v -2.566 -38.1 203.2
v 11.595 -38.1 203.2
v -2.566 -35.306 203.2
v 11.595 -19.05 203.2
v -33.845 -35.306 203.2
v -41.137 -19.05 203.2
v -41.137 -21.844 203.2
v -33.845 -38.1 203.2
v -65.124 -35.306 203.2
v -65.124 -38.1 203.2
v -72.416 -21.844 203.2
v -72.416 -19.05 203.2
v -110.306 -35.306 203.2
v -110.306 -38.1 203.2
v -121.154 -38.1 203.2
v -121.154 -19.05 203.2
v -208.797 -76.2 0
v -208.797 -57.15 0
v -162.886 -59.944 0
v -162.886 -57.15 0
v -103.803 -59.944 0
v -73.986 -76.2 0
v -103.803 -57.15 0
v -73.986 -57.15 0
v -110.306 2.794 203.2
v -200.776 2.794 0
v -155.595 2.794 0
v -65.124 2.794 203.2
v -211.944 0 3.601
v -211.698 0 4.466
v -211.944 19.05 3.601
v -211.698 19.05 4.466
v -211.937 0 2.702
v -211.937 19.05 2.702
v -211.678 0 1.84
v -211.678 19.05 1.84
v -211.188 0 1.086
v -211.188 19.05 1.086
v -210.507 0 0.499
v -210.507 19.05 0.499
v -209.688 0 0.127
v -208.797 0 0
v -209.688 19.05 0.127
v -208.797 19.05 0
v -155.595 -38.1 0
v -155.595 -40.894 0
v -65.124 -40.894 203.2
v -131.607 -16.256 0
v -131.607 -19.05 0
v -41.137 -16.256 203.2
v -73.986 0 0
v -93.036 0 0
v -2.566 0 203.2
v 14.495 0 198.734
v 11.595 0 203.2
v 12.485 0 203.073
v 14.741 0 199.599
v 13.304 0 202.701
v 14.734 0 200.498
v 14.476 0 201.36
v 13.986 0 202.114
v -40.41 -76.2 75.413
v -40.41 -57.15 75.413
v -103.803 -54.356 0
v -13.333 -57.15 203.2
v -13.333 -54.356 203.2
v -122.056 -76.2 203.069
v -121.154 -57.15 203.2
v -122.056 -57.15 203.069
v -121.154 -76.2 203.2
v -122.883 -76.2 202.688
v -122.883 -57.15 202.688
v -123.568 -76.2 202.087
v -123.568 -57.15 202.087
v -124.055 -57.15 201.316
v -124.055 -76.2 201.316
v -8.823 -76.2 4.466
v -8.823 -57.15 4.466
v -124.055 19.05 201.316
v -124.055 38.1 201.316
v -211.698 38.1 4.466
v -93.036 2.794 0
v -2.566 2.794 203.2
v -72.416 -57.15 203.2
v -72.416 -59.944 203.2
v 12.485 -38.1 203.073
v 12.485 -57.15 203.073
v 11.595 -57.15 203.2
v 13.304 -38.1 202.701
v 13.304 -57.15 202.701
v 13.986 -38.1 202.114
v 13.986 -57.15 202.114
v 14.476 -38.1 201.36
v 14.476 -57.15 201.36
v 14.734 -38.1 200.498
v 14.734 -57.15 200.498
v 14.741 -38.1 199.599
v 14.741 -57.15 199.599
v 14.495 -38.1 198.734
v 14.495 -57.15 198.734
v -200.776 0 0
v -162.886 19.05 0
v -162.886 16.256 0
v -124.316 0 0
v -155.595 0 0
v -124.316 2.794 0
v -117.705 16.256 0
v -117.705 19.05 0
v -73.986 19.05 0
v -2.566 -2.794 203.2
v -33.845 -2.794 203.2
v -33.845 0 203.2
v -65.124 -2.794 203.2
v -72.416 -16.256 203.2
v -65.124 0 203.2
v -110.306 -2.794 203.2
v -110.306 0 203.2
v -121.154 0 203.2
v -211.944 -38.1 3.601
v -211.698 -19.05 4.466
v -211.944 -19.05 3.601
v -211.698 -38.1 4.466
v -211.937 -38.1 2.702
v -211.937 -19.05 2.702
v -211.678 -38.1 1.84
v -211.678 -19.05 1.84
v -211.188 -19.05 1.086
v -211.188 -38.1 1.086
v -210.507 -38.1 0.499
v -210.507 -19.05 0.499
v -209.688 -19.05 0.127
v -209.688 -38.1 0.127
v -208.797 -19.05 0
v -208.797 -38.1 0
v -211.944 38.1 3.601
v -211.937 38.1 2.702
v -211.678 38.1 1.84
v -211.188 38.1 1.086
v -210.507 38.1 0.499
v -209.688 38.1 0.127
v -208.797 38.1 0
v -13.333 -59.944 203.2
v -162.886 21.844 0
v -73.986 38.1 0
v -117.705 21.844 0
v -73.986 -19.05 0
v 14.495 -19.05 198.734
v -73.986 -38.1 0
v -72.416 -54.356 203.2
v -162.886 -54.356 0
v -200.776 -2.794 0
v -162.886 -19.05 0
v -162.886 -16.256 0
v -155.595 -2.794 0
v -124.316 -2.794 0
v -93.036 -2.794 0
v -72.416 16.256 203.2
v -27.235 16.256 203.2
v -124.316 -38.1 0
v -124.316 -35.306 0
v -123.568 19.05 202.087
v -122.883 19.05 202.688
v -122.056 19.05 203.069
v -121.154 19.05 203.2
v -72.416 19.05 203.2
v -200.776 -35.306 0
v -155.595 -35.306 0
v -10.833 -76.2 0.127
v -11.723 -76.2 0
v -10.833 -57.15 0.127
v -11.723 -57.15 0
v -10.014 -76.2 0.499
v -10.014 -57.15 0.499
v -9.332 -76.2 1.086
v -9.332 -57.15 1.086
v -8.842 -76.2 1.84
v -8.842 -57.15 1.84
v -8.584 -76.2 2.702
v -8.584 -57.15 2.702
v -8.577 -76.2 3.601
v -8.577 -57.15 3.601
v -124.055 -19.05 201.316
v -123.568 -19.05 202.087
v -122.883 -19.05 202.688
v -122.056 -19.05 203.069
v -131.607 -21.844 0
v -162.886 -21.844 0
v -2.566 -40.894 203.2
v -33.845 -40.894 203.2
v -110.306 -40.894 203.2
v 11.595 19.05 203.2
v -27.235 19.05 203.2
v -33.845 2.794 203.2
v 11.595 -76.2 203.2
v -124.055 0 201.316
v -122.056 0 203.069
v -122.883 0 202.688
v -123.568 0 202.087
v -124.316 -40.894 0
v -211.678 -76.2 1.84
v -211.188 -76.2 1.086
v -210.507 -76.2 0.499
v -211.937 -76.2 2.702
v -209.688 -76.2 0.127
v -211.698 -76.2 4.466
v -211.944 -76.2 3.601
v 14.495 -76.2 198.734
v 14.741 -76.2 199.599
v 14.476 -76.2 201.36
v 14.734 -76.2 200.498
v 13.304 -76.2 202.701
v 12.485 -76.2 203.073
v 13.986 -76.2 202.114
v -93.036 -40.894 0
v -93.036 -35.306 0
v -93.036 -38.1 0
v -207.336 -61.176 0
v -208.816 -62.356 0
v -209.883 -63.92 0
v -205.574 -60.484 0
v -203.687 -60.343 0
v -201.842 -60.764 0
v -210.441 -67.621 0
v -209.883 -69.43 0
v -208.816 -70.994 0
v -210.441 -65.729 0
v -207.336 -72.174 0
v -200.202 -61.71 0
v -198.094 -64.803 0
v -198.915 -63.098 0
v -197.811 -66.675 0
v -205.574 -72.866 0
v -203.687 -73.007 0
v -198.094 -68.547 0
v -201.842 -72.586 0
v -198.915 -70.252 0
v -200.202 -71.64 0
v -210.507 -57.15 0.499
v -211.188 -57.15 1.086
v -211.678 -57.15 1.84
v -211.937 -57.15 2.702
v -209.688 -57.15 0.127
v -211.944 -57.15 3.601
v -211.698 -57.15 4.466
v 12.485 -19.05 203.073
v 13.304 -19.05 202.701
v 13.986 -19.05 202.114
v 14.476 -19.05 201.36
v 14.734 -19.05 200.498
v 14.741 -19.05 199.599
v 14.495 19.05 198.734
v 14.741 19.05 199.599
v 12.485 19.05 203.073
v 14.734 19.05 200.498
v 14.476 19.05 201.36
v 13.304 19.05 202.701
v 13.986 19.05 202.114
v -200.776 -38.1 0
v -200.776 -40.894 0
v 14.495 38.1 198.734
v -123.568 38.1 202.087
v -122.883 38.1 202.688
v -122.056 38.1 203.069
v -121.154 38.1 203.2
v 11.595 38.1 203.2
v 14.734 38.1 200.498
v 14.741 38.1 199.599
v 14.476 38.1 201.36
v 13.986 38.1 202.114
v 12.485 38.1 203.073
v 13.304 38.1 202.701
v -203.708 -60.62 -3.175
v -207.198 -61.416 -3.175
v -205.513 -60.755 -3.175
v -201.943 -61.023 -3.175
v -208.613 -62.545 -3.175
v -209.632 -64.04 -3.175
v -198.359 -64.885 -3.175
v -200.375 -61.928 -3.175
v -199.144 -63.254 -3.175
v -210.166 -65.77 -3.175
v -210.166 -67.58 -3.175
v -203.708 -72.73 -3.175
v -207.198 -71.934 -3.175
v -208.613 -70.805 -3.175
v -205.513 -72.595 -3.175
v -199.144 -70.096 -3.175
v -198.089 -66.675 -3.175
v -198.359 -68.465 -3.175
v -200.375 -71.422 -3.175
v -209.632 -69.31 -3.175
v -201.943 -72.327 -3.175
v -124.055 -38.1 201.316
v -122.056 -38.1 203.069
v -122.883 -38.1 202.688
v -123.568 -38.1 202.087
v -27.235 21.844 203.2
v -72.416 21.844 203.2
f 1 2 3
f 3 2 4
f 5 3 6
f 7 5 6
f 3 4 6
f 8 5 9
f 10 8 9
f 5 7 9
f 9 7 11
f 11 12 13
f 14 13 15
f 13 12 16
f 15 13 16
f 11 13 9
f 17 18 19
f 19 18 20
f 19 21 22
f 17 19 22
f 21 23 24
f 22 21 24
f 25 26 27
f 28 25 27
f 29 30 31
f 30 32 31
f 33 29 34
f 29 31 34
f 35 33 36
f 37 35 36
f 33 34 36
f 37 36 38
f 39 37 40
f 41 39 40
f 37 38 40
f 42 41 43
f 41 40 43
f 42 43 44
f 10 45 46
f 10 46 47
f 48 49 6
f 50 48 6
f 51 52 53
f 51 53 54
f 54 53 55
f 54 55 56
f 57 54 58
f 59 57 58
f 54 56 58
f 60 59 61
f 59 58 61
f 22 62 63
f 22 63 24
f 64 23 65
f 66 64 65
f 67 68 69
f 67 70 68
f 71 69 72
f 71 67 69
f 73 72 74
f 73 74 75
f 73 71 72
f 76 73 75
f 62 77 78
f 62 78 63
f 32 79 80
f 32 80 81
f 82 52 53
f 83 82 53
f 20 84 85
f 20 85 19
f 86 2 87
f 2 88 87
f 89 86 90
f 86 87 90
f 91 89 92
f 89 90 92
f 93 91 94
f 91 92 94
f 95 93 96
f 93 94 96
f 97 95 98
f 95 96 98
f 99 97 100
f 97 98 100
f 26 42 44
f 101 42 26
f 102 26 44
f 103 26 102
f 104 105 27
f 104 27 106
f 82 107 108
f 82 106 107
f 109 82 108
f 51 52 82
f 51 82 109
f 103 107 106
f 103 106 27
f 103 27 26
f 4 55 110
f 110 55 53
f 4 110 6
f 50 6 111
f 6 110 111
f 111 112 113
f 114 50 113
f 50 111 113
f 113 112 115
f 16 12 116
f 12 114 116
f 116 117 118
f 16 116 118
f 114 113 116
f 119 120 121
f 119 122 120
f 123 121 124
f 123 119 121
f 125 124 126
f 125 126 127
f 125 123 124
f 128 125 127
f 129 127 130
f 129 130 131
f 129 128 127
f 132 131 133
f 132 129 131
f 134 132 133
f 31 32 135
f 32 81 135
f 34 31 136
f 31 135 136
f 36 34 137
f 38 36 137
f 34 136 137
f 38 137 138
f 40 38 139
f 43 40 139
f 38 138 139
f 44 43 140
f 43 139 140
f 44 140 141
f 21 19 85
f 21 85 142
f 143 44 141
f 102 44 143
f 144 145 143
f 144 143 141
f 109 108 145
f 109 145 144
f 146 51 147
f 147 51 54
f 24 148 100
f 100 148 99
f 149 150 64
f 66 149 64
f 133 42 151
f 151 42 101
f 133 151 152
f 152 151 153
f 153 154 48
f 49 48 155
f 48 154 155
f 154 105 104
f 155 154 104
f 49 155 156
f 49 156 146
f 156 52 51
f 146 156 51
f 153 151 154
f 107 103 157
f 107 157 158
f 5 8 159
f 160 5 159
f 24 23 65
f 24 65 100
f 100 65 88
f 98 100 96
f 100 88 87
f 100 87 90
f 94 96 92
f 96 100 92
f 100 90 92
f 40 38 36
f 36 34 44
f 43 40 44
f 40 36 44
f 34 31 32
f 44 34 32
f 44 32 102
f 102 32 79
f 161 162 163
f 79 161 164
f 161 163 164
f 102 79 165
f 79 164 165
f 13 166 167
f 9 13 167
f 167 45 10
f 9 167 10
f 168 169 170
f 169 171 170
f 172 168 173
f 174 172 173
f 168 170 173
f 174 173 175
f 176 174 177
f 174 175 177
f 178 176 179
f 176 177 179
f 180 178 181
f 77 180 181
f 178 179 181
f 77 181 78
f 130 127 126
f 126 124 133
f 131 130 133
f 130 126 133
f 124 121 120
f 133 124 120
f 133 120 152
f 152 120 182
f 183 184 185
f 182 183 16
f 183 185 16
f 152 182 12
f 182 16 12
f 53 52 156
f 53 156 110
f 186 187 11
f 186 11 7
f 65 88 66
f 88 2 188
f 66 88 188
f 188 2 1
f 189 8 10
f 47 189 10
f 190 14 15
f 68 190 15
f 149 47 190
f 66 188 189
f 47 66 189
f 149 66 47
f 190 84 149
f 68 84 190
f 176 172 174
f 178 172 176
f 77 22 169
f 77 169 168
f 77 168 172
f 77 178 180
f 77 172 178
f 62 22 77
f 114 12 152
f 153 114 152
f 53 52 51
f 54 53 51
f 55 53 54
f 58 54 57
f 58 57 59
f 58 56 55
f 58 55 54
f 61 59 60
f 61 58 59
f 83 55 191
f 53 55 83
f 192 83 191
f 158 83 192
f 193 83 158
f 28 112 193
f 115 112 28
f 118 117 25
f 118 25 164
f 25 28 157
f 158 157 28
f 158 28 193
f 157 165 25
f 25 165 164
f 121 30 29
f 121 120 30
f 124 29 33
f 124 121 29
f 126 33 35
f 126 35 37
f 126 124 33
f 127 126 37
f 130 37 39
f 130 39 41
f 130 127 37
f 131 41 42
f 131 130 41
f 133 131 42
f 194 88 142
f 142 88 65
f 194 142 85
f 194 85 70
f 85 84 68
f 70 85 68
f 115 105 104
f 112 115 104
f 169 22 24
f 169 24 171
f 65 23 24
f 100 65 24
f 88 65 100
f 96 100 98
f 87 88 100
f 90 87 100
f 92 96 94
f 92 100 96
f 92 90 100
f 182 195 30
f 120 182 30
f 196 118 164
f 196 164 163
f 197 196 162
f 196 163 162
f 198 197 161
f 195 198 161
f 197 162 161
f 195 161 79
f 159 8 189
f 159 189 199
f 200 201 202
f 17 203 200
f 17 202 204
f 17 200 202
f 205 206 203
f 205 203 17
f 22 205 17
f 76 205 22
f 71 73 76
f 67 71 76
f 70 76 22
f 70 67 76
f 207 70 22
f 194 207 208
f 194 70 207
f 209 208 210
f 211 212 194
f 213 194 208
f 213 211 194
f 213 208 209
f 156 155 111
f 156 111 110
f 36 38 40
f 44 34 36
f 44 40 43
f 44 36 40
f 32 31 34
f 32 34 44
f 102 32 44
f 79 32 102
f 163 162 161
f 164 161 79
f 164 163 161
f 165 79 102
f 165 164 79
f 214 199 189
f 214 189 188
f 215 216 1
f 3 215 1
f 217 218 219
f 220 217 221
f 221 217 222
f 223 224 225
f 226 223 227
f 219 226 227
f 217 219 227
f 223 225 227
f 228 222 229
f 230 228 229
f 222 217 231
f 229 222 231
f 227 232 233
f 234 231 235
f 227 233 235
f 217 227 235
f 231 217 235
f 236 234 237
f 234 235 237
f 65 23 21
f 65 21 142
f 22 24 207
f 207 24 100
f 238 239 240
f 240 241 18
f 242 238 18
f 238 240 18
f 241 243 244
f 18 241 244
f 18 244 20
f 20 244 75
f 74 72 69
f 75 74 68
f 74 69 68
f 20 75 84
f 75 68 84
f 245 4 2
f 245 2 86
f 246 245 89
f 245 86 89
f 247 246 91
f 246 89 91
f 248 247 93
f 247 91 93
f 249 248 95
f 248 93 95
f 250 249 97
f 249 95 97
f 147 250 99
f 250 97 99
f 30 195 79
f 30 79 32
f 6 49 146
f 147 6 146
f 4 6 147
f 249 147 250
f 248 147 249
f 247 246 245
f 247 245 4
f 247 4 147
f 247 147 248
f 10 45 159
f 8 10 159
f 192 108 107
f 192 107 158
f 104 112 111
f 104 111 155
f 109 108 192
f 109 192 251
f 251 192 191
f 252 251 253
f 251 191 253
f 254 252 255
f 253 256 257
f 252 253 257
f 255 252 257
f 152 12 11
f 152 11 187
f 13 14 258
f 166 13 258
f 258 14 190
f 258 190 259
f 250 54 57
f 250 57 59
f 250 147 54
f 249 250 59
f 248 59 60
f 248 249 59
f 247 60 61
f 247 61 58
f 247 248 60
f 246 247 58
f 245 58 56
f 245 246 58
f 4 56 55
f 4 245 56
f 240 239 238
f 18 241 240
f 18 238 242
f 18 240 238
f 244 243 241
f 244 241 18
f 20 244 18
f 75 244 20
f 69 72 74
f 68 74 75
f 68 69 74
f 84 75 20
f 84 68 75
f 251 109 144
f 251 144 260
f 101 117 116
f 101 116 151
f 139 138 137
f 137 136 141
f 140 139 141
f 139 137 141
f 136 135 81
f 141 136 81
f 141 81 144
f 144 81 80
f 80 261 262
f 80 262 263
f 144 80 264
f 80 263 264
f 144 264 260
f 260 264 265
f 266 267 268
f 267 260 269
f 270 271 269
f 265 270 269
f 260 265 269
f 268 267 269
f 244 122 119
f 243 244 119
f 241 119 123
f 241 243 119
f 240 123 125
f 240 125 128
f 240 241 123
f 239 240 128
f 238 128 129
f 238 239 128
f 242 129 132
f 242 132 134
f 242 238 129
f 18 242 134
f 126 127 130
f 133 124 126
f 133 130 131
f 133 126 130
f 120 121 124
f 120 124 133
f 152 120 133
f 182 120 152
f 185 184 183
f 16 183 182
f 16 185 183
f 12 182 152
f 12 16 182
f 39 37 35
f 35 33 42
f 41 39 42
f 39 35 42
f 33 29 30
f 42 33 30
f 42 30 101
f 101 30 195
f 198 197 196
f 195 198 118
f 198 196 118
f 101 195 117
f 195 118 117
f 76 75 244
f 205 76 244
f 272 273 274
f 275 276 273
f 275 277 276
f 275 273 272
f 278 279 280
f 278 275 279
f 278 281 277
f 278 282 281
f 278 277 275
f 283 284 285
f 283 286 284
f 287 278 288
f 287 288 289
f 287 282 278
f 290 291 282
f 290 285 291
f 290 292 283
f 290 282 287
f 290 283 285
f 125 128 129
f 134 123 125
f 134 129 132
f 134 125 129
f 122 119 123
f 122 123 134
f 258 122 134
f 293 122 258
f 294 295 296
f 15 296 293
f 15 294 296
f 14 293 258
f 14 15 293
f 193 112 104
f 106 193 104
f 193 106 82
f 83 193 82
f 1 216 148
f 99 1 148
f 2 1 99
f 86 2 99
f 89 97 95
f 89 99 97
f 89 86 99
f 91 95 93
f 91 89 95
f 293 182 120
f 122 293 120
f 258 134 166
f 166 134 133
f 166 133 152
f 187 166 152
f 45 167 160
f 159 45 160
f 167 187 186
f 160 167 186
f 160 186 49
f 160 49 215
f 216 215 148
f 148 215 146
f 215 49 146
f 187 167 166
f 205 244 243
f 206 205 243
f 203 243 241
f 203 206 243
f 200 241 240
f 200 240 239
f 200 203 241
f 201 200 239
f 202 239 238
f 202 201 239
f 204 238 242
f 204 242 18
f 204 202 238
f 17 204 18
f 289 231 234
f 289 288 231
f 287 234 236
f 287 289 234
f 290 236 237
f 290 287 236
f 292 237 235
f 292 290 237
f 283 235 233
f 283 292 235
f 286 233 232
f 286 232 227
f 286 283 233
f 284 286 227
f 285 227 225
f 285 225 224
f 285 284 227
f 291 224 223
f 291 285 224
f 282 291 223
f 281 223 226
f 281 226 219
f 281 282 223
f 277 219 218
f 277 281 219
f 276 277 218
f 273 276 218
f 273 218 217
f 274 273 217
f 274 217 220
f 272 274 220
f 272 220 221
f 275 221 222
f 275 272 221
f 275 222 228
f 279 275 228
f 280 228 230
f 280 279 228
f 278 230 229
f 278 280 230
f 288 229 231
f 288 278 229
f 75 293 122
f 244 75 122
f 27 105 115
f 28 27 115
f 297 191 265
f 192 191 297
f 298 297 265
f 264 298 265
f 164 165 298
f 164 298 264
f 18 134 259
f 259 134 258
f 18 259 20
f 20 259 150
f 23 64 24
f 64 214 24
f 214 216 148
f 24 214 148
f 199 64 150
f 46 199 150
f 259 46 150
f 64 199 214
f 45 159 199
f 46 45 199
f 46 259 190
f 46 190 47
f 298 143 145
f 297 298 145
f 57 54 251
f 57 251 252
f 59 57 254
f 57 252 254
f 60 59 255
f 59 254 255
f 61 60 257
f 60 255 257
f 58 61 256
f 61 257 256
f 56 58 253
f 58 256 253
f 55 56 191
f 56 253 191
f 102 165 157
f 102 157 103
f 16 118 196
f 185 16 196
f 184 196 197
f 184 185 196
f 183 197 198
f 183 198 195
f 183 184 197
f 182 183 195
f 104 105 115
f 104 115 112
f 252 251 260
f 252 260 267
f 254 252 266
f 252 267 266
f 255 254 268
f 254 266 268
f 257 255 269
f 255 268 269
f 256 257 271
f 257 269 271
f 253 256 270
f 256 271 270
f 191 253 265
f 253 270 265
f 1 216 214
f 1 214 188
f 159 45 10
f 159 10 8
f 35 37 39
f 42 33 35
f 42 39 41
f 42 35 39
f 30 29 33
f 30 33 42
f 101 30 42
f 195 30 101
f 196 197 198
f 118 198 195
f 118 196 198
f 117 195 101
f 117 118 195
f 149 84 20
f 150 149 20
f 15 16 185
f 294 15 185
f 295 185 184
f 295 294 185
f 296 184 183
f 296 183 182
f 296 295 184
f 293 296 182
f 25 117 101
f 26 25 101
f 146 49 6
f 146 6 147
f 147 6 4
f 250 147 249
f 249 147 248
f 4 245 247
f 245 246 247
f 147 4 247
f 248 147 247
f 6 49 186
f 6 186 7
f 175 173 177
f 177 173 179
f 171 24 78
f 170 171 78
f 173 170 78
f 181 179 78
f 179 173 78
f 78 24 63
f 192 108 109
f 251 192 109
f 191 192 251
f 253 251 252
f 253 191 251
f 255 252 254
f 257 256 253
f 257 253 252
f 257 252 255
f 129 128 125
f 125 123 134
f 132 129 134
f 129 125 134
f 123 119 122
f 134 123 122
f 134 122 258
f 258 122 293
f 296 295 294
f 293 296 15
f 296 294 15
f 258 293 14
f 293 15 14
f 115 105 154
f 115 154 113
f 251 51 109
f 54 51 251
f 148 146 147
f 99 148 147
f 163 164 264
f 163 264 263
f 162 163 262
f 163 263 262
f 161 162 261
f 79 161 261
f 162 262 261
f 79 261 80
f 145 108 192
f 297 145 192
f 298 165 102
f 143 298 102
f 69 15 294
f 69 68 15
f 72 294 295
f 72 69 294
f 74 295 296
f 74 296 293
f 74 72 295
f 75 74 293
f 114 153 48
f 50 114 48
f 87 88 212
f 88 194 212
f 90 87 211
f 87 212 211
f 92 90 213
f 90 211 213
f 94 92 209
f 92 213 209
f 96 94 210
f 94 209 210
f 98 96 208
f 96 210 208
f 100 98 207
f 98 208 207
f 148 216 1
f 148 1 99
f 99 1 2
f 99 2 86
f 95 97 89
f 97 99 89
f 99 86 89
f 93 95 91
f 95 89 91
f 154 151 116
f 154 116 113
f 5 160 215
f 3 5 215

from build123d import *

# Parameters (mm, degrees)
F1_DEPTH  = 19.05
F6_DEPTH  = 19.05
F8_DEPTH  = 19.05
F9_DEPTH  = 19.05
F11_DEPTH = 19.05
F14_DEPTH = 19.05
F16_DEPTH = 2.794
F17_DEPTH = 2.794
F19_DEPTH = 2.794
F20_DEPTH = 2.794
F22_DEPTH = 2.794
F23_DEPTH = 2.794
F25_DEPTH = 2.794
F26_DEPTH = 2.794
F28_DEPTH = 2.794
F29_DEPTH = 2.794
F31_DEPTH = 19.05
F32_R     = 3.175
F32_2_R   = 3.175
F32_3_R   = 3.175
F32_4_R   = 3.175
F32_5_R   = 3.175
F32_6_R   = 3.175
F33_R     = 3.175
F33_2_R   = 3.175
F33_3_R   = 3.175
F33_4_R   = 3.175
F33_5_R   = 3.175
F33_6_R   = 3.175
F34_R     = 6.35
F35_DEPTH = 3.175
F35_TAPER = 5
F36_R     = 3.175
F37_R     = 3.175
F37_2_R   = 3.175
F37_3_R   = 3.175
F37_4_R   = 3.175
F37_5_R   = 3.175
F37_6_R   = 3.175


with BuildPart() as f1:
    # F0 (on Front) → F1 (new body)
    with BuildSketch(Plane.XZ):
        Polygon((-213.6864438653, 0), (-73.9864438653, 0), (16.4840249894, 203.2), (-123.2159750106, 203.2), align=None)
    extrude(amount=F1_DEPTH)

    # F18 (on face) → F20 (cut)
    with BuildSketch(Plane.XZ):
        Polygon((-2.5659750106, 203.2), (-33.8452066689, 203.2), (-124.3156755236, 0), (-93.0364438653, 0), align=None)
        Polygon((-65.1244383272, 203.2), (-110.3055507226, 203.2), (-200.7760195773, 0), (-155.5949071819, 0), align=None)
    extrude(amount=F20_DEPTH, mode=Mode.SUBTRACT)

    # F21 (on face) → F22 (cut)
    with BuildSketch(Plane.XZ.offset(19.05)):
        Polygon((-41.1367433523, 203.2), (-72.4159750106, 203.2), (-162.8864438653, 0), (-131.607212207, 0), align=None)
    extrude(amount=-F22_DEPTH, mode=Mode.SUBTRACT)

    # F32#3
    f32_3_edges = [f1.edges().sort_by_distance(p)[0] for p in [
        (16.484025, -9.525, 203.2),
    ]]
    fillet(f32_3_edges, radius=F32_3_R)

    # F33#3
    f33_3_edges = [f1.edges().sort_by_distance(p)[0] for p in [
        (-123.215975, -9.525, 203.2),
    ]]
    fillet(f33_3_edges, radius=F33_3_R)

    # F37#3
    f37_3_edges = [f1.edges().sort_by_distance(p)[0] for p in [
        (-213.686444, -9.525, 0),
    ]]
    fillet(f37_3_edges, radius=F37_3_R)


with BuildPart() as f6:
    # F5 (on offset) → F6 (new body)
    with BuildSketch(Plane.XZ.offset(19.05)):
        Polygon((-123.2159750106, 203.2), (-213.6864438653, 0), (-73.9864438653, 0), (16.4840249894, 203.2), align=None)
    extrude(amount=F6_DEPTH)

    # F21 (on face) → F23 (cut)
    with BuildSketch(Plane.XZ.offset(19.05)):
        Polygon((-41.1367433523, 203.2), (-72.4159750106, 203.2), (-162.8864438653, 0), (-131.607212207, 0), align=None)
    extrude(amount=F23_DEPTH, mode=Mode.SUBTRACT)

    # F24 (on face) → F25 (cut)
    with BuildSketch(Plane.XZ.offset(38.1)):
        Polygon((-65.1244383272, 203.2), (-110.3055507226, 203.2), (-200.7760195773, 0), (-155.5949071819, 0), align=None)
        Polygon((-2.5659750106, 203.2), (-33.8452066689, 203.2), (-124.3156755236, 0), (-93.0364438653, 0), align=None)
    extrude(amount=-F25_DEPTH, mode=Mode.SUBTRACT)

    # F32#4
    f32_4_edges = [f6.edges().sort_by_distance(p)[0] for p in [
        (16.484025, -28.575, 203.2),
    ]]
    fillet(f32_4_edges, radius=F32_4_R)

    # F33#4
    f33_4_edges = [f6.edges().sort_by_distance(p)[0] for p in [
        (-123.215975, -28.575, 203.2),
    ]]
    fillet(f33_4_edges, radius=F33_4_R)

    # F37#4
    f37_4_edges = [f6.edges().sort_by_distance(p)[0] for p in [
        (-213.686444, -28.575, 0),
    ]]
    fillet(f37_4_edges, radius=F37_4_R)


with BuildPart() as f8:
    # F7 (on offset) → F8 (new body)
    with BuildSketch(Plane.XZ.offset(38.1)):
        Polygon((16.4840249894, 203.2), (-123.2159750106, 203.2), (-213.6864438653, 0), (-73.9864438653, 0), align=None)
    extrude(amount=F8_DEPTH)

    # F24 (on face) → F26 (cut)
    with BuildSketch(Plane.XZ.offset(38.1)):
        Polygon((-2.5659750106, 203.2), (-33.8452066689, 203.2), (-124.3156755236, 0), (-93.0364438653, 0), align=None)
        Polygon((-65.1244383272, 203.2), (-110.3055507226, 203.2), (-200.7760195773, 0), (-155.5949071819, 0), align=None)
    extrude(amount=F26_DEPTH, mode=Mode.SUBTRACT)

    # F27 (on face) → F28 (cut)
    with BuildSketch(Plane.XZ.offset(57.15)):
        Polygon((-13.3329818782, 203.2), (-72.4159750106, 203.2), (-162.8864438653, 0), (-103.8034507329, 0), align=None)
    extrude(amount=-F28_DEPTH, mode=Mode.SUBTRACT)

    # F32#5
    f32_5_edges = [f8.edges().sort_by_distance(p)[0] for p in [
        (16.484025, -47.625, 203.2),
    ]]
    fillet(f32_5_edges, radius=F32_5_R)

    # F33#5
    f33_5_edges = [f8.edges().sort_by_distance(p)[0] for p in [
        (-123.215975, -47.625, 203.2),
    ]]
    fillet(f33_5_edges, radius=F33_5_R)

    # F37#5
    f37_5_edges = [f8.edges().sort_by_distance(p)[0] for p in [
        (-213.686444, -47.625, 0),
    ]]
    fillet(f37_5_edges, radius=F37_5_R)


with BuildPart() as f9:
    # F0 (on Front) → F9 (new body)
    with BuildSketch(Plane.XZ):
        Polygon((-213.6864438653, 0), (-73.9864438653, 0), (16.4840249894, 203.2), (-123.2159750106, 203.2), align=None)
    extrude(amount=-F9_DEPTH)

    # F15 (on face) → F17 (cut)
    with BuildSketch(Plane.XZ.offset(-19.05)):
        Polygon((-27.2348626153, 203.2), (-72.4159750106, 203.2), (-162.8864438653, 0), (-117.70533147, 0), align=None)
    extrude(amount=F17_DEPTH, mode=Mode.SUBTRACT)

    # F18 (on face) → F19 (cut)
    with BuildSketch(Plane.XZ):
        Polygon((-65.1244383272, 203.2), (-110.3055507226, 203.2), (-200.7760195773, 0), (-155.5949071819, 0), align=None)
        Polygon((-2.5659750106, 203.2), (-33.8452066689, 203.2), (-124.3156755236, 0), (-93.0364438653, 0), align=None)
    extrude(amount=-F19_DEPTH, mode=Mode.SUBTRACT)

    # F32#2
    f32_2_edges = [f9.edges().sort_by_distance(p)[0] for p in [
        (16.484025, 9.525, 203.2),
    ]]
    fillet(f32_2_edges, radius=F32_2_R)

    # F33#2
    f33_2_edges = [f9.edges().sort_by_distance(p)[0] for p in [
        (-123.215975, 9.525, 203.2),
    ]]
    fillet(f33_2_edges, radius=F33_2_R)

    # F37#2
    f37_2_edges = [f9.edges().sort_by_distance(p)[0] for p in [
        (-213.686444, 9.525, 0),
    ]]
    fillet(f37_2_edges, radius=F37_2_R)


with BuildPart() as f11:
    # F10 (on offset) → F11 (new body)
    with BuildSketch(Plane.XZ.offset(-19.05)):
        Polygon((-213.6864438653, 0), (-73.9864438653, 0), (16.4840249894, 203.2), (-123.2159750106, 203.2), align=None)
    extrude(amount=-F11_DEPTH)

    # F15 (on face) → F16 (cut)
    with BuildSketch(Plane.XZ.offset(-19.05)):
        Polygon((-27.2348626153, 203.2), (-72.4159750106, 203.2), (-162.8864438653, 0), (-117.70533147, 0), align=None)
    extrude(amount=-F16_DEPTH, mode=Mode.SUBTRACT)

    # F32
    f32_edges = [f11.edges().sort_by_distance(p)[0] for p in [
        (16.484025, 28.575, 203.2),
    ]]
    fillet(f32_edges, radius=F32_R)

    # F33
    f33_edges = [f11.edges().sort_by_distance(p)[0] for p in [
        (-123.215975, 28.575, 203.2),
    ]]
    fillet(f33_edges, radius=F33_R)

    # F37
    f37_edges = [f11.edges().sort_by_distance(p)[0] for p in [
        (-213.686444, 28.575, 0),
    ]]
    fillet(f37_edges, radius=F37_R)


with BuildPart() as f14:
    # F13 (on offset) → F14 (new body)
    with BuildSketch(Plane.XZ.offset(57.15)):
        Polygon((-123.2159750106, 203.2), (-213.6864438653, 0), (-73.9864438653, 0), (16.4840249894, 203.2), align=None)
    extrude(amount=F14_DEPTH)

    # F27 (on face) → F29 (cut)
    with BuildSketch(Plane.XZ.offset(57.15)):
        Polygon((-13.3329818782, 203.2), (-72.4159750106, 203.2), (-162.8864438653, 0), (-103.8034507329, 0), align=None)
    extrude(amount=F29_DEPTH, mode=Mode.SUBTRACT)

    # F32#6
    f32_6_edges = [f14.edges().sort_by_distance(p)[0] for p in [
        (16.484025, -66.675, 203.2),
    ]]
    fillet(f32_6_edges, radius=F32_6_R)

    # F33#6
    f33_6_edges = [f14.edges().sort_by_distance(p)[0] for p in [
        (-123.215975, -66.675, 203.2),
    ]]
    fillet(f33_6_edges, radius=F33_6_R)

    # F37#6
    f37_6_edges = [f14.edges().sort_by_distance(p)[0] for p in [
        (-213.686444, -66.675, 0),
    ]]
    fillet(f37_6_edges, radius=F37_6_R)


with BuildPart() as f31:
    # F30 (on face) → F31 (new body)
    with BuildSketch(Plane.XZ.offset(76.2)):
        Polygon((-40.4103339794, 75.4131775284), (-73.9864438653, 0), (-6.8342240935, 0), align=None)
    extrude(amount=-F31_DEPTH)

    # F36
    f36_edges = [f31.edges().sort_by_distance(p)[0] for p in [
        (-6.834224, -66.675, 0),
    ]]
    fillet(f36_edges, radius=F36_R)


with BuildPart() as f35:
    # F34 (on face) → F35 (new body)
    with BuildSketch(Plane(origin=(0, 0, 0), x_dir=(1, 0, 0), z_dir=(0, 0, -1))):
        with Locations((-204.1614438653, 66.675)):
            Circle(F34_R)
    extrude(amount=F35_DEPTH, taper=F35_TAPER)


solid = Compound([f1.part, f6.part, f8.part, f9.part, f11.part, f14.part, f31.part, f35.part])
